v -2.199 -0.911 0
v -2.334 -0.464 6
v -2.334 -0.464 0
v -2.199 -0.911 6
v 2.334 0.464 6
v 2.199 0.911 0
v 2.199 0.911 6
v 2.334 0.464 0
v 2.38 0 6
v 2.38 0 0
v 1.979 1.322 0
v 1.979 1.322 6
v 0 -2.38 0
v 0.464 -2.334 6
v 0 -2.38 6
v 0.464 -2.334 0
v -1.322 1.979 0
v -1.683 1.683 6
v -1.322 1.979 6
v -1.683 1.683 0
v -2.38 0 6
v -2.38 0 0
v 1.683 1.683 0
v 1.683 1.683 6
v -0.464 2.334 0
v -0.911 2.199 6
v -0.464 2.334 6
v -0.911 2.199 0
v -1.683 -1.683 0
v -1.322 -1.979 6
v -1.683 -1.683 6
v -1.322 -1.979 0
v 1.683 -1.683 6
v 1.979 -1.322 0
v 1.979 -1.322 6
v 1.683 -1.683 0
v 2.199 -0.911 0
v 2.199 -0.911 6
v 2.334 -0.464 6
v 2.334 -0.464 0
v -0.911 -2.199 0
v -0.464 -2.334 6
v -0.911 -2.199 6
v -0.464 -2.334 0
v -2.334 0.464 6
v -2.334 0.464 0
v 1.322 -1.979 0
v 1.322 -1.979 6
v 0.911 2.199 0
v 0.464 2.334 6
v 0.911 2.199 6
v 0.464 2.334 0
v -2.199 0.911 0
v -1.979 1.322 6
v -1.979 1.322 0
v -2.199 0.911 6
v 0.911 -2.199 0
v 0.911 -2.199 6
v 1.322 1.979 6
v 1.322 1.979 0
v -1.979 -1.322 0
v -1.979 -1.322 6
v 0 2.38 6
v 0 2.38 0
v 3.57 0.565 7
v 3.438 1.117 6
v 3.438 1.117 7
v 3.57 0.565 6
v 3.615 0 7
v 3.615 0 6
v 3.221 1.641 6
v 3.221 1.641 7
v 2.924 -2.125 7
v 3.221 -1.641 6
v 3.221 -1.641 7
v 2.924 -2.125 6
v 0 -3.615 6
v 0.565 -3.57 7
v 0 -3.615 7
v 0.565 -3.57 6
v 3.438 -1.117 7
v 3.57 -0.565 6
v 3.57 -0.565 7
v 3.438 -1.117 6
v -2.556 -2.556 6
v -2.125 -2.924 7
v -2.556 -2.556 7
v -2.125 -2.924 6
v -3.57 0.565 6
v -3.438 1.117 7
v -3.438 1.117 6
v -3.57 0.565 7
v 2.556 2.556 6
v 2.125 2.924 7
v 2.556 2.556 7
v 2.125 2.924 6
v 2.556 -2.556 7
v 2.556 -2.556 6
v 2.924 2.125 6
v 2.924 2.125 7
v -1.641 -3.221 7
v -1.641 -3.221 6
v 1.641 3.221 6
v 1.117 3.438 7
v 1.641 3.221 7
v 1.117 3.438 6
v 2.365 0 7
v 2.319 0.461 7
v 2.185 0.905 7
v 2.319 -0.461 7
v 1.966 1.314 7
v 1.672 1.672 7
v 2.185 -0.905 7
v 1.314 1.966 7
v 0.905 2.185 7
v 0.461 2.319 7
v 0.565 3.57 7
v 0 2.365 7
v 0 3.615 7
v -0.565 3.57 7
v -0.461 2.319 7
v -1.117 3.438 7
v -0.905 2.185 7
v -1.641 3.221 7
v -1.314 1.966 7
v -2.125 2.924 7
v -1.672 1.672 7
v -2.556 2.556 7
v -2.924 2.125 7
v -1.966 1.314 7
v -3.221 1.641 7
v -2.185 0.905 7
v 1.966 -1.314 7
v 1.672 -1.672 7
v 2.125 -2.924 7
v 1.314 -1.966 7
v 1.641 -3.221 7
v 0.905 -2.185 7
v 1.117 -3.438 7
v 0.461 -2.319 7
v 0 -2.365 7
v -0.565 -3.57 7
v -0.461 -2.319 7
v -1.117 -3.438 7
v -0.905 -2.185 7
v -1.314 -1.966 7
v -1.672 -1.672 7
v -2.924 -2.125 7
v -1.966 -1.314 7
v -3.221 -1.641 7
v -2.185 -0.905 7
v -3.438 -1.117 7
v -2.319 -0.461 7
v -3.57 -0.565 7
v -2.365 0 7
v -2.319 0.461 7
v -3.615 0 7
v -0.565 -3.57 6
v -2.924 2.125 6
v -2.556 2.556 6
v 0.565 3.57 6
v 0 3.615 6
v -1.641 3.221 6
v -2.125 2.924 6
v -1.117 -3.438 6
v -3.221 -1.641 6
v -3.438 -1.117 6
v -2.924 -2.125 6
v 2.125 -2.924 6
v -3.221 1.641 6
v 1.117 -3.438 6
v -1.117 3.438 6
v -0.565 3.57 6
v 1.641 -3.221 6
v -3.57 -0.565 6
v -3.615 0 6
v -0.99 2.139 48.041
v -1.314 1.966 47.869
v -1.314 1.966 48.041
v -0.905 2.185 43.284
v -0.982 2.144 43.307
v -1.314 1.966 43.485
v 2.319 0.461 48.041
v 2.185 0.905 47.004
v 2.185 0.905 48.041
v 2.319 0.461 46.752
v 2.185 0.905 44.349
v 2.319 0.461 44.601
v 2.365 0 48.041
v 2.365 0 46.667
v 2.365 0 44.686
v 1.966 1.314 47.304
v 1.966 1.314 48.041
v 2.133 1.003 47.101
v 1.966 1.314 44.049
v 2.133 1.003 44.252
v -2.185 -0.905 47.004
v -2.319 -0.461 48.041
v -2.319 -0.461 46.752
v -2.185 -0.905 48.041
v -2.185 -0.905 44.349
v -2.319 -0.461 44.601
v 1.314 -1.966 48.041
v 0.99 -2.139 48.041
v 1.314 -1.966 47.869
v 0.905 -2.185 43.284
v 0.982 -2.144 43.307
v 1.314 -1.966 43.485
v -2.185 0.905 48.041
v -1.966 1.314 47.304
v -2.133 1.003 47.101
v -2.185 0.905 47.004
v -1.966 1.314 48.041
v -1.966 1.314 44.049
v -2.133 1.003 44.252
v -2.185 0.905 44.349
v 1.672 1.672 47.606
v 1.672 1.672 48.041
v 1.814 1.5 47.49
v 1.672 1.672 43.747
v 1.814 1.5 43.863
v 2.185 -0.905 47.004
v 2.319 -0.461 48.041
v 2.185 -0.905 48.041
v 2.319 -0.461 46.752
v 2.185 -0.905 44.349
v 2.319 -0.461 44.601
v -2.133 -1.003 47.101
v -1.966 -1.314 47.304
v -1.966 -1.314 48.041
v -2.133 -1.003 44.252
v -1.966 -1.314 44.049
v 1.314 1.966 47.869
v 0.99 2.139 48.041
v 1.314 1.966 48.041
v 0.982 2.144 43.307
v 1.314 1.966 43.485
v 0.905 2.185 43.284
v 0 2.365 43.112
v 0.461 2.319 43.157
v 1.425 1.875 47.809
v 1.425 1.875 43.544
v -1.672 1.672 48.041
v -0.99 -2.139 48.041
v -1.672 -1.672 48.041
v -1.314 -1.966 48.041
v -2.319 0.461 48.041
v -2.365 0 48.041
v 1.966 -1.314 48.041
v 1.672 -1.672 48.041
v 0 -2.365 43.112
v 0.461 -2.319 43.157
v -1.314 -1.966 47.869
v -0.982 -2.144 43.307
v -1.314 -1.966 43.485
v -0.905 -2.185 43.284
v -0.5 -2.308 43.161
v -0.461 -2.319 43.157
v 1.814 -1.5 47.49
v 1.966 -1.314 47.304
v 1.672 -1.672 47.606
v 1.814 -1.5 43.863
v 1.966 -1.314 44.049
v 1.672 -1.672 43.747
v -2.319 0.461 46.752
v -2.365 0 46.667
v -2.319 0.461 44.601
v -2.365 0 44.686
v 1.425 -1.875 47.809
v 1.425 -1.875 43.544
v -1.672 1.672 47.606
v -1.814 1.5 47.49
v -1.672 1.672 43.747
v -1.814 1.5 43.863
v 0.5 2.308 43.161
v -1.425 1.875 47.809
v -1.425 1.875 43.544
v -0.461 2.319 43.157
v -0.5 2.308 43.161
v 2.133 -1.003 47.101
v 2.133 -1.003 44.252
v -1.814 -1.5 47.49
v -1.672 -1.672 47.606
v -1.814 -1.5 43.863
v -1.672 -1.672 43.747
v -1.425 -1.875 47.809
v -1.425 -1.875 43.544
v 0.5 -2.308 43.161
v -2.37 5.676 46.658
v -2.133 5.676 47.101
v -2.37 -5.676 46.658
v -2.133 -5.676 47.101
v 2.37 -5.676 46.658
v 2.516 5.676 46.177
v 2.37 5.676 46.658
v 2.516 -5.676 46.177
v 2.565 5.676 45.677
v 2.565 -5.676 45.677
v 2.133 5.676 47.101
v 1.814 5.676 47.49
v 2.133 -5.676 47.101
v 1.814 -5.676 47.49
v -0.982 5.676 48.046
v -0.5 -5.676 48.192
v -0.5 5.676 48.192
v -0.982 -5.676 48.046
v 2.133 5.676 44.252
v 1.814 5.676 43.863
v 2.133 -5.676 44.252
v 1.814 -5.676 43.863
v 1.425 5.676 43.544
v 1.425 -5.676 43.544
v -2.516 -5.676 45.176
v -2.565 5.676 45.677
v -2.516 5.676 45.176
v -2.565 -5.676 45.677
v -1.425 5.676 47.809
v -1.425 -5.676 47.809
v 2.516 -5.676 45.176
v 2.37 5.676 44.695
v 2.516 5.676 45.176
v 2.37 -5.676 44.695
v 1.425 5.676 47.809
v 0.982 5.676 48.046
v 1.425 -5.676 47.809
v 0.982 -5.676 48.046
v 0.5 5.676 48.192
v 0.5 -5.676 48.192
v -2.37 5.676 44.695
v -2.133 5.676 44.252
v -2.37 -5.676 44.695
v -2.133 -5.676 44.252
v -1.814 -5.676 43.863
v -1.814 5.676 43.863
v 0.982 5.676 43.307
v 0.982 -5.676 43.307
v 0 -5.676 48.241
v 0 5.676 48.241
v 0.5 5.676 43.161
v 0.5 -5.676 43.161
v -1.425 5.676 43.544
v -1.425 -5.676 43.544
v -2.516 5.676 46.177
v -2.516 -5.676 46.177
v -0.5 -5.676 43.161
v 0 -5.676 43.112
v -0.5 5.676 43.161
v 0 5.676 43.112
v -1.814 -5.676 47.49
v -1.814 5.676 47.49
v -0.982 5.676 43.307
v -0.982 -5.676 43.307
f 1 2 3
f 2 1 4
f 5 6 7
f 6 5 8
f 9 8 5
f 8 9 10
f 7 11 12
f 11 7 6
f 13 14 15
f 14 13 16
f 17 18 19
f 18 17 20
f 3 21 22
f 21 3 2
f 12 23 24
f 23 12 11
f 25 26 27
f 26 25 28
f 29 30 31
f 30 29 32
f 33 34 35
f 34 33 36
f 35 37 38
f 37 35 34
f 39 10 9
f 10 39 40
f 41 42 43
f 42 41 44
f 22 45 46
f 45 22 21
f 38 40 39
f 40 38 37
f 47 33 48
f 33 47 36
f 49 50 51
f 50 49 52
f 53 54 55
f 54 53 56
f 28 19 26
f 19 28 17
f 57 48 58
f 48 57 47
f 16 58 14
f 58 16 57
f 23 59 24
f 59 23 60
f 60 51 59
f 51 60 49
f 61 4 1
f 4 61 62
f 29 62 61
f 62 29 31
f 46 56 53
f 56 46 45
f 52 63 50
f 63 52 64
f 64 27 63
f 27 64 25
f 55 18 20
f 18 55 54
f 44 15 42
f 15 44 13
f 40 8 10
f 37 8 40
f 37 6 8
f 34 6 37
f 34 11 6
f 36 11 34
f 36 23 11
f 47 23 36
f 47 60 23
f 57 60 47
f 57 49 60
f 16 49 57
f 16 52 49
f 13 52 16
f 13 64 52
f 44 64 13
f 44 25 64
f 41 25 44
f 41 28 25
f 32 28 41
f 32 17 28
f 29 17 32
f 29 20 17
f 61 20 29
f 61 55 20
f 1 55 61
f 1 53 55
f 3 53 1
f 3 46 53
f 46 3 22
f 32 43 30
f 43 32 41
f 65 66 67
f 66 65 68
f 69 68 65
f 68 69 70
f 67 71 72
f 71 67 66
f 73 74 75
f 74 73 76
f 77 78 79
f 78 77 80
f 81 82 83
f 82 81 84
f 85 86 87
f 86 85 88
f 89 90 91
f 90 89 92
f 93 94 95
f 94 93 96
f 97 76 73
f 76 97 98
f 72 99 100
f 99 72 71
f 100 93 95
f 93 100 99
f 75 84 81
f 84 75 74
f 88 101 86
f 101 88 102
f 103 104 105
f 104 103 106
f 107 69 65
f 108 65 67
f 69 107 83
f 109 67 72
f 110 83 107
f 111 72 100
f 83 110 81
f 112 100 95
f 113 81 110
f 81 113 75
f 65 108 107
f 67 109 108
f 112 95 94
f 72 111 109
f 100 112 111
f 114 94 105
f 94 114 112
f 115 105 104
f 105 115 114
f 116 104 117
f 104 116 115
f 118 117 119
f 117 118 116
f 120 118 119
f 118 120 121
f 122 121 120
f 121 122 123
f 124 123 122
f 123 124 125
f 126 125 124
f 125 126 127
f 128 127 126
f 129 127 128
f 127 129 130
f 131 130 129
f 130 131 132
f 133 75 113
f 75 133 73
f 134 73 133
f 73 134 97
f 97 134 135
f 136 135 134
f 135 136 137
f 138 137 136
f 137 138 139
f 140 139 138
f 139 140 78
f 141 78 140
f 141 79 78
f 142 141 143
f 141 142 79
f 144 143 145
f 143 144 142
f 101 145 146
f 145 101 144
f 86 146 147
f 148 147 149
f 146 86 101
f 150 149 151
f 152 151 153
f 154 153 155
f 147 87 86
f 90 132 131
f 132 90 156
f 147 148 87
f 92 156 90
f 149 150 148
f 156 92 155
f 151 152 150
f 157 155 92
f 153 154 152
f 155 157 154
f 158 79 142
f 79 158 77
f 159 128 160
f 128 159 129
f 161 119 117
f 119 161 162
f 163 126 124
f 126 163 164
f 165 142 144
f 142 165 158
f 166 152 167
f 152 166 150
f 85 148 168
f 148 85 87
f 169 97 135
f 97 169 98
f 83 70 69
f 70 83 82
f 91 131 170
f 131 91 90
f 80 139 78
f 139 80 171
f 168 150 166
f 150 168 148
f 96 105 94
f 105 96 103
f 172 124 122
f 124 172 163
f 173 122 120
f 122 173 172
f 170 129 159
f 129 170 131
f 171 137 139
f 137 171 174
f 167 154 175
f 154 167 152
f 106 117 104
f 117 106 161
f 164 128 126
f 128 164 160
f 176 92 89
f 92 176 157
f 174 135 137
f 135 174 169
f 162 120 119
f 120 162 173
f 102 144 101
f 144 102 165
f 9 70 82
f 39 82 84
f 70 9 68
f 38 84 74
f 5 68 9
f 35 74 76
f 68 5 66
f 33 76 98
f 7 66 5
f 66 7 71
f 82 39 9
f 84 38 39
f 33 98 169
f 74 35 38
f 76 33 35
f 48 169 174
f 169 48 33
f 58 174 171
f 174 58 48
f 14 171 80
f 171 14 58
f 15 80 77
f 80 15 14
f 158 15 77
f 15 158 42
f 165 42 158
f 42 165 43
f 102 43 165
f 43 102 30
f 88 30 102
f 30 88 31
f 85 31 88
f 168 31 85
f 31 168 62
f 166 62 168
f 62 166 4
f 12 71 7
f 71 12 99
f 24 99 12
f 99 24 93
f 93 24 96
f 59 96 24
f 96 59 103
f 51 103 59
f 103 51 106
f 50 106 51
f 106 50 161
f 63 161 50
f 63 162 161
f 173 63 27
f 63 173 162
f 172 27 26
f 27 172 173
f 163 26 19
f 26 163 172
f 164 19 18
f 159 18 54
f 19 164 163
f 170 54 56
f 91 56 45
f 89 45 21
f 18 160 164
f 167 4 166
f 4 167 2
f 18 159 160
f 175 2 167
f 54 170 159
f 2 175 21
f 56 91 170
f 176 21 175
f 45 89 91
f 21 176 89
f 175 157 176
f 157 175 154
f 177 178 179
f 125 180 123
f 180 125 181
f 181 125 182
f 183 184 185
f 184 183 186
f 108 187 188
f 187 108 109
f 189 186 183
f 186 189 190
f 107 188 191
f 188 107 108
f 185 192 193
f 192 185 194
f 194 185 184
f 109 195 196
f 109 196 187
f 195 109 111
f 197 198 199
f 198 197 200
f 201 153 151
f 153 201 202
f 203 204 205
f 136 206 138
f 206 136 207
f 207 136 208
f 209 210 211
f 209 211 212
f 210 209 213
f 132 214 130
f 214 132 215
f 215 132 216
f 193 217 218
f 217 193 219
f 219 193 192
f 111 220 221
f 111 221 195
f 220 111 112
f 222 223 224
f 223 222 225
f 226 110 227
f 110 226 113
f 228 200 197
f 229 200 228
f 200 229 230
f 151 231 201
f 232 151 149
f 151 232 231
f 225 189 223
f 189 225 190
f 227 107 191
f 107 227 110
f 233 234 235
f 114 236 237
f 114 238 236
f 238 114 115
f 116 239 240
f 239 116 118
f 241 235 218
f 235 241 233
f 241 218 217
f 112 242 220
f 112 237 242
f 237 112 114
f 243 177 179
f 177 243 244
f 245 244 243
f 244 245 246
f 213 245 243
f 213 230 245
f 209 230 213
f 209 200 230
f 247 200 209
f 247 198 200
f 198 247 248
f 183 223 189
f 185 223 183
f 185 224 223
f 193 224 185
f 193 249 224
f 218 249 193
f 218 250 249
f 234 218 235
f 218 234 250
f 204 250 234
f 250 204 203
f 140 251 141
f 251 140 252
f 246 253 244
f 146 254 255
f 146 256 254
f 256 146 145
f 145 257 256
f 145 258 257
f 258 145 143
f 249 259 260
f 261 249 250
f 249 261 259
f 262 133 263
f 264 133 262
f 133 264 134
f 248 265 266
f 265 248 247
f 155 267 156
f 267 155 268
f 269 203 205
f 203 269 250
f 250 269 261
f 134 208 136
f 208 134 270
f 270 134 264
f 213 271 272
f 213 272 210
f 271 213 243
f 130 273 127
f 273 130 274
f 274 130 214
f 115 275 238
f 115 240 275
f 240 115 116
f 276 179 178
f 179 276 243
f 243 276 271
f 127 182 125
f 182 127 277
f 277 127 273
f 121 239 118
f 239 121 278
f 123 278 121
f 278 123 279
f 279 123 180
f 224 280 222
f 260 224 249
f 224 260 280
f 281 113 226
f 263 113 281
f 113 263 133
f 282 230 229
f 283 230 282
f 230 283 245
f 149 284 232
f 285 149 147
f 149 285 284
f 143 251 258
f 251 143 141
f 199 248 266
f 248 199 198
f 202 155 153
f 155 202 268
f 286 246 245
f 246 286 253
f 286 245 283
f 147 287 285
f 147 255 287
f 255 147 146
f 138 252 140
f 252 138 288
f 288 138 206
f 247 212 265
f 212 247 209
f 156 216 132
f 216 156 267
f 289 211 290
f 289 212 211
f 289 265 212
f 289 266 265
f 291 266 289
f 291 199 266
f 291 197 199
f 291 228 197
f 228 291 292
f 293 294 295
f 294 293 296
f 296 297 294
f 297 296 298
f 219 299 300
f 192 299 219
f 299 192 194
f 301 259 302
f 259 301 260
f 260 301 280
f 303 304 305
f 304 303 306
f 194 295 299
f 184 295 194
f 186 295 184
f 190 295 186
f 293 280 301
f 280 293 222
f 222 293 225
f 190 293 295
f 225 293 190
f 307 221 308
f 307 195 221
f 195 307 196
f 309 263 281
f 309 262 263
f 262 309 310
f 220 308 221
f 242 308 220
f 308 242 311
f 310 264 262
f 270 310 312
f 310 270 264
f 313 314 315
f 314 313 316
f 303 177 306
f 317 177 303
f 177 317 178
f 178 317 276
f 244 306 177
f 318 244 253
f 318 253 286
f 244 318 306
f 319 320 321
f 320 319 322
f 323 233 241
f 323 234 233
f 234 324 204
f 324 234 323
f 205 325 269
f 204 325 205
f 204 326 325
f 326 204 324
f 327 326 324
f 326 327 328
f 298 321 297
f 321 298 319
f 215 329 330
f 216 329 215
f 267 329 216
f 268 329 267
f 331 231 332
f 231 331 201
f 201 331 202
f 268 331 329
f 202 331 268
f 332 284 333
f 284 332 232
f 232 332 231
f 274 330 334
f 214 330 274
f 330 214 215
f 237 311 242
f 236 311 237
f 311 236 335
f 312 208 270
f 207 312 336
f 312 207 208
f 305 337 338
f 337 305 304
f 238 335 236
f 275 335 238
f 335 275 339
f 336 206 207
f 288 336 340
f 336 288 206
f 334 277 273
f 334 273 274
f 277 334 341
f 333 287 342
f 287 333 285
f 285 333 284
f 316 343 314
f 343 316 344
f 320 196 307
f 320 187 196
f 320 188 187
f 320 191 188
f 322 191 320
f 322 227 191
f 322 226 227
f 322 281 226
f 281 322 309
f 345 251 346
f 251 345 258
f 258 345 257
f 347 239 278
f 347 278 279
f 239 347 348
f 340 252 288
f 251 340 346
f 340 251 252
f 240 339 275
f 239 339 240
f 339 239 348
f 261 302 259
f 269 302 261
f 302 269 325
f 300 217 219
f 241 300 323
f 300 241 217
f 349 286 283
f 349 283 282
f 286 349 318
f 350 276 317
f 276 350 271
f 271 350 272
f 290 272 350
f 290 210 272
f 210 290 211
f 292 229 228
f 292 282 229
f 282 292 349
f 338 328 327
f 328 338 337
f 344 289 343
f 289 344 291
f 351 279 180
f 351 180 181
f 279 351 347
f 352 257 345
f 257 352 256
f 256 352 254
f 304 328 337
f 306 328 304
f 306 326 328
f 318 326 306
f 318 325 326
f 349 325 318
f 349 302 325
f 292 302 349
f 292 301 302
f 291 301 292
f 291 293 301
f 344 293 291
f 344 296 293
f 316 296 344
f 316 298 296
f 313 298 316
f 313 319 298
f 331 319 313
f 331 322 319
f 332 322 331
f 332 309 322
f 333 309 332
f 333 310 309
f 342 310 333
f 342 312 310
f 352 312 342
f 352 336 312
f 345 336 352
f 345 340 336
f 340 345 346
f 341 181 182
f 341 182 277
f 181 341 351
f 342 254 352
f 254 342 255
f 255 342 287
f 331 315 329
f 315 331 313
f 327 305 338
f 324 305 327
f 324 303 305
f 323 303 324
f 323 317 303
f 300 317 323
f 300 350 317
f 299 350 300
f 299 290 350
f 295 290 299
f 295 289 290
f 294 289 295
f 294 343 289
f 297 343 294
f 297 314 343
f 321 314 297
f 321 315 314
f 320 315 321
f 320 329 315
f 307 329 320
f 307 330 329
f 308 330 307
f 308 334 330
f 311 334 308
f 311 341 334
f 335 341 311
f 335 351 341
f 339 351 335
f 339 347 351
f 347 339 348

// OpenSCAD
// =====================================================================
//  VIEW 12: SMOKESTACK  -  print 1
//  Milwaukee Road 1939 rib side bay window caboose - G scale (1:29)
//  Coal stove smokestack
//  Print orientation: upright
//
//  Open this file in OpenSCAD to look at just this part.
//  To export this part's STL: Render (F6), then File > Export > STL.
//  The part's code lives in library/smokestack.scad; settings in
//  library/caboose_params.scad.
// =====================================================================

part     = "smokestack";    // which part - leave as is
view     = "print";  // "print"     = laid out as it goes on the printer bed
                     //               (same as the exported STL)
                     // "installed" = in its place on the car (all copies)
show_car = false;    // with "installed": faint see-through body, roof and
                     //   underframe around it for context

include <../library/caboose_all.scad>

if (view == "installed") {
    caboose_installed(part);
    if (show_car) car_ghost();
} else {
    caboose_print(part);
}
echo(str("smokestack: print 1"));
